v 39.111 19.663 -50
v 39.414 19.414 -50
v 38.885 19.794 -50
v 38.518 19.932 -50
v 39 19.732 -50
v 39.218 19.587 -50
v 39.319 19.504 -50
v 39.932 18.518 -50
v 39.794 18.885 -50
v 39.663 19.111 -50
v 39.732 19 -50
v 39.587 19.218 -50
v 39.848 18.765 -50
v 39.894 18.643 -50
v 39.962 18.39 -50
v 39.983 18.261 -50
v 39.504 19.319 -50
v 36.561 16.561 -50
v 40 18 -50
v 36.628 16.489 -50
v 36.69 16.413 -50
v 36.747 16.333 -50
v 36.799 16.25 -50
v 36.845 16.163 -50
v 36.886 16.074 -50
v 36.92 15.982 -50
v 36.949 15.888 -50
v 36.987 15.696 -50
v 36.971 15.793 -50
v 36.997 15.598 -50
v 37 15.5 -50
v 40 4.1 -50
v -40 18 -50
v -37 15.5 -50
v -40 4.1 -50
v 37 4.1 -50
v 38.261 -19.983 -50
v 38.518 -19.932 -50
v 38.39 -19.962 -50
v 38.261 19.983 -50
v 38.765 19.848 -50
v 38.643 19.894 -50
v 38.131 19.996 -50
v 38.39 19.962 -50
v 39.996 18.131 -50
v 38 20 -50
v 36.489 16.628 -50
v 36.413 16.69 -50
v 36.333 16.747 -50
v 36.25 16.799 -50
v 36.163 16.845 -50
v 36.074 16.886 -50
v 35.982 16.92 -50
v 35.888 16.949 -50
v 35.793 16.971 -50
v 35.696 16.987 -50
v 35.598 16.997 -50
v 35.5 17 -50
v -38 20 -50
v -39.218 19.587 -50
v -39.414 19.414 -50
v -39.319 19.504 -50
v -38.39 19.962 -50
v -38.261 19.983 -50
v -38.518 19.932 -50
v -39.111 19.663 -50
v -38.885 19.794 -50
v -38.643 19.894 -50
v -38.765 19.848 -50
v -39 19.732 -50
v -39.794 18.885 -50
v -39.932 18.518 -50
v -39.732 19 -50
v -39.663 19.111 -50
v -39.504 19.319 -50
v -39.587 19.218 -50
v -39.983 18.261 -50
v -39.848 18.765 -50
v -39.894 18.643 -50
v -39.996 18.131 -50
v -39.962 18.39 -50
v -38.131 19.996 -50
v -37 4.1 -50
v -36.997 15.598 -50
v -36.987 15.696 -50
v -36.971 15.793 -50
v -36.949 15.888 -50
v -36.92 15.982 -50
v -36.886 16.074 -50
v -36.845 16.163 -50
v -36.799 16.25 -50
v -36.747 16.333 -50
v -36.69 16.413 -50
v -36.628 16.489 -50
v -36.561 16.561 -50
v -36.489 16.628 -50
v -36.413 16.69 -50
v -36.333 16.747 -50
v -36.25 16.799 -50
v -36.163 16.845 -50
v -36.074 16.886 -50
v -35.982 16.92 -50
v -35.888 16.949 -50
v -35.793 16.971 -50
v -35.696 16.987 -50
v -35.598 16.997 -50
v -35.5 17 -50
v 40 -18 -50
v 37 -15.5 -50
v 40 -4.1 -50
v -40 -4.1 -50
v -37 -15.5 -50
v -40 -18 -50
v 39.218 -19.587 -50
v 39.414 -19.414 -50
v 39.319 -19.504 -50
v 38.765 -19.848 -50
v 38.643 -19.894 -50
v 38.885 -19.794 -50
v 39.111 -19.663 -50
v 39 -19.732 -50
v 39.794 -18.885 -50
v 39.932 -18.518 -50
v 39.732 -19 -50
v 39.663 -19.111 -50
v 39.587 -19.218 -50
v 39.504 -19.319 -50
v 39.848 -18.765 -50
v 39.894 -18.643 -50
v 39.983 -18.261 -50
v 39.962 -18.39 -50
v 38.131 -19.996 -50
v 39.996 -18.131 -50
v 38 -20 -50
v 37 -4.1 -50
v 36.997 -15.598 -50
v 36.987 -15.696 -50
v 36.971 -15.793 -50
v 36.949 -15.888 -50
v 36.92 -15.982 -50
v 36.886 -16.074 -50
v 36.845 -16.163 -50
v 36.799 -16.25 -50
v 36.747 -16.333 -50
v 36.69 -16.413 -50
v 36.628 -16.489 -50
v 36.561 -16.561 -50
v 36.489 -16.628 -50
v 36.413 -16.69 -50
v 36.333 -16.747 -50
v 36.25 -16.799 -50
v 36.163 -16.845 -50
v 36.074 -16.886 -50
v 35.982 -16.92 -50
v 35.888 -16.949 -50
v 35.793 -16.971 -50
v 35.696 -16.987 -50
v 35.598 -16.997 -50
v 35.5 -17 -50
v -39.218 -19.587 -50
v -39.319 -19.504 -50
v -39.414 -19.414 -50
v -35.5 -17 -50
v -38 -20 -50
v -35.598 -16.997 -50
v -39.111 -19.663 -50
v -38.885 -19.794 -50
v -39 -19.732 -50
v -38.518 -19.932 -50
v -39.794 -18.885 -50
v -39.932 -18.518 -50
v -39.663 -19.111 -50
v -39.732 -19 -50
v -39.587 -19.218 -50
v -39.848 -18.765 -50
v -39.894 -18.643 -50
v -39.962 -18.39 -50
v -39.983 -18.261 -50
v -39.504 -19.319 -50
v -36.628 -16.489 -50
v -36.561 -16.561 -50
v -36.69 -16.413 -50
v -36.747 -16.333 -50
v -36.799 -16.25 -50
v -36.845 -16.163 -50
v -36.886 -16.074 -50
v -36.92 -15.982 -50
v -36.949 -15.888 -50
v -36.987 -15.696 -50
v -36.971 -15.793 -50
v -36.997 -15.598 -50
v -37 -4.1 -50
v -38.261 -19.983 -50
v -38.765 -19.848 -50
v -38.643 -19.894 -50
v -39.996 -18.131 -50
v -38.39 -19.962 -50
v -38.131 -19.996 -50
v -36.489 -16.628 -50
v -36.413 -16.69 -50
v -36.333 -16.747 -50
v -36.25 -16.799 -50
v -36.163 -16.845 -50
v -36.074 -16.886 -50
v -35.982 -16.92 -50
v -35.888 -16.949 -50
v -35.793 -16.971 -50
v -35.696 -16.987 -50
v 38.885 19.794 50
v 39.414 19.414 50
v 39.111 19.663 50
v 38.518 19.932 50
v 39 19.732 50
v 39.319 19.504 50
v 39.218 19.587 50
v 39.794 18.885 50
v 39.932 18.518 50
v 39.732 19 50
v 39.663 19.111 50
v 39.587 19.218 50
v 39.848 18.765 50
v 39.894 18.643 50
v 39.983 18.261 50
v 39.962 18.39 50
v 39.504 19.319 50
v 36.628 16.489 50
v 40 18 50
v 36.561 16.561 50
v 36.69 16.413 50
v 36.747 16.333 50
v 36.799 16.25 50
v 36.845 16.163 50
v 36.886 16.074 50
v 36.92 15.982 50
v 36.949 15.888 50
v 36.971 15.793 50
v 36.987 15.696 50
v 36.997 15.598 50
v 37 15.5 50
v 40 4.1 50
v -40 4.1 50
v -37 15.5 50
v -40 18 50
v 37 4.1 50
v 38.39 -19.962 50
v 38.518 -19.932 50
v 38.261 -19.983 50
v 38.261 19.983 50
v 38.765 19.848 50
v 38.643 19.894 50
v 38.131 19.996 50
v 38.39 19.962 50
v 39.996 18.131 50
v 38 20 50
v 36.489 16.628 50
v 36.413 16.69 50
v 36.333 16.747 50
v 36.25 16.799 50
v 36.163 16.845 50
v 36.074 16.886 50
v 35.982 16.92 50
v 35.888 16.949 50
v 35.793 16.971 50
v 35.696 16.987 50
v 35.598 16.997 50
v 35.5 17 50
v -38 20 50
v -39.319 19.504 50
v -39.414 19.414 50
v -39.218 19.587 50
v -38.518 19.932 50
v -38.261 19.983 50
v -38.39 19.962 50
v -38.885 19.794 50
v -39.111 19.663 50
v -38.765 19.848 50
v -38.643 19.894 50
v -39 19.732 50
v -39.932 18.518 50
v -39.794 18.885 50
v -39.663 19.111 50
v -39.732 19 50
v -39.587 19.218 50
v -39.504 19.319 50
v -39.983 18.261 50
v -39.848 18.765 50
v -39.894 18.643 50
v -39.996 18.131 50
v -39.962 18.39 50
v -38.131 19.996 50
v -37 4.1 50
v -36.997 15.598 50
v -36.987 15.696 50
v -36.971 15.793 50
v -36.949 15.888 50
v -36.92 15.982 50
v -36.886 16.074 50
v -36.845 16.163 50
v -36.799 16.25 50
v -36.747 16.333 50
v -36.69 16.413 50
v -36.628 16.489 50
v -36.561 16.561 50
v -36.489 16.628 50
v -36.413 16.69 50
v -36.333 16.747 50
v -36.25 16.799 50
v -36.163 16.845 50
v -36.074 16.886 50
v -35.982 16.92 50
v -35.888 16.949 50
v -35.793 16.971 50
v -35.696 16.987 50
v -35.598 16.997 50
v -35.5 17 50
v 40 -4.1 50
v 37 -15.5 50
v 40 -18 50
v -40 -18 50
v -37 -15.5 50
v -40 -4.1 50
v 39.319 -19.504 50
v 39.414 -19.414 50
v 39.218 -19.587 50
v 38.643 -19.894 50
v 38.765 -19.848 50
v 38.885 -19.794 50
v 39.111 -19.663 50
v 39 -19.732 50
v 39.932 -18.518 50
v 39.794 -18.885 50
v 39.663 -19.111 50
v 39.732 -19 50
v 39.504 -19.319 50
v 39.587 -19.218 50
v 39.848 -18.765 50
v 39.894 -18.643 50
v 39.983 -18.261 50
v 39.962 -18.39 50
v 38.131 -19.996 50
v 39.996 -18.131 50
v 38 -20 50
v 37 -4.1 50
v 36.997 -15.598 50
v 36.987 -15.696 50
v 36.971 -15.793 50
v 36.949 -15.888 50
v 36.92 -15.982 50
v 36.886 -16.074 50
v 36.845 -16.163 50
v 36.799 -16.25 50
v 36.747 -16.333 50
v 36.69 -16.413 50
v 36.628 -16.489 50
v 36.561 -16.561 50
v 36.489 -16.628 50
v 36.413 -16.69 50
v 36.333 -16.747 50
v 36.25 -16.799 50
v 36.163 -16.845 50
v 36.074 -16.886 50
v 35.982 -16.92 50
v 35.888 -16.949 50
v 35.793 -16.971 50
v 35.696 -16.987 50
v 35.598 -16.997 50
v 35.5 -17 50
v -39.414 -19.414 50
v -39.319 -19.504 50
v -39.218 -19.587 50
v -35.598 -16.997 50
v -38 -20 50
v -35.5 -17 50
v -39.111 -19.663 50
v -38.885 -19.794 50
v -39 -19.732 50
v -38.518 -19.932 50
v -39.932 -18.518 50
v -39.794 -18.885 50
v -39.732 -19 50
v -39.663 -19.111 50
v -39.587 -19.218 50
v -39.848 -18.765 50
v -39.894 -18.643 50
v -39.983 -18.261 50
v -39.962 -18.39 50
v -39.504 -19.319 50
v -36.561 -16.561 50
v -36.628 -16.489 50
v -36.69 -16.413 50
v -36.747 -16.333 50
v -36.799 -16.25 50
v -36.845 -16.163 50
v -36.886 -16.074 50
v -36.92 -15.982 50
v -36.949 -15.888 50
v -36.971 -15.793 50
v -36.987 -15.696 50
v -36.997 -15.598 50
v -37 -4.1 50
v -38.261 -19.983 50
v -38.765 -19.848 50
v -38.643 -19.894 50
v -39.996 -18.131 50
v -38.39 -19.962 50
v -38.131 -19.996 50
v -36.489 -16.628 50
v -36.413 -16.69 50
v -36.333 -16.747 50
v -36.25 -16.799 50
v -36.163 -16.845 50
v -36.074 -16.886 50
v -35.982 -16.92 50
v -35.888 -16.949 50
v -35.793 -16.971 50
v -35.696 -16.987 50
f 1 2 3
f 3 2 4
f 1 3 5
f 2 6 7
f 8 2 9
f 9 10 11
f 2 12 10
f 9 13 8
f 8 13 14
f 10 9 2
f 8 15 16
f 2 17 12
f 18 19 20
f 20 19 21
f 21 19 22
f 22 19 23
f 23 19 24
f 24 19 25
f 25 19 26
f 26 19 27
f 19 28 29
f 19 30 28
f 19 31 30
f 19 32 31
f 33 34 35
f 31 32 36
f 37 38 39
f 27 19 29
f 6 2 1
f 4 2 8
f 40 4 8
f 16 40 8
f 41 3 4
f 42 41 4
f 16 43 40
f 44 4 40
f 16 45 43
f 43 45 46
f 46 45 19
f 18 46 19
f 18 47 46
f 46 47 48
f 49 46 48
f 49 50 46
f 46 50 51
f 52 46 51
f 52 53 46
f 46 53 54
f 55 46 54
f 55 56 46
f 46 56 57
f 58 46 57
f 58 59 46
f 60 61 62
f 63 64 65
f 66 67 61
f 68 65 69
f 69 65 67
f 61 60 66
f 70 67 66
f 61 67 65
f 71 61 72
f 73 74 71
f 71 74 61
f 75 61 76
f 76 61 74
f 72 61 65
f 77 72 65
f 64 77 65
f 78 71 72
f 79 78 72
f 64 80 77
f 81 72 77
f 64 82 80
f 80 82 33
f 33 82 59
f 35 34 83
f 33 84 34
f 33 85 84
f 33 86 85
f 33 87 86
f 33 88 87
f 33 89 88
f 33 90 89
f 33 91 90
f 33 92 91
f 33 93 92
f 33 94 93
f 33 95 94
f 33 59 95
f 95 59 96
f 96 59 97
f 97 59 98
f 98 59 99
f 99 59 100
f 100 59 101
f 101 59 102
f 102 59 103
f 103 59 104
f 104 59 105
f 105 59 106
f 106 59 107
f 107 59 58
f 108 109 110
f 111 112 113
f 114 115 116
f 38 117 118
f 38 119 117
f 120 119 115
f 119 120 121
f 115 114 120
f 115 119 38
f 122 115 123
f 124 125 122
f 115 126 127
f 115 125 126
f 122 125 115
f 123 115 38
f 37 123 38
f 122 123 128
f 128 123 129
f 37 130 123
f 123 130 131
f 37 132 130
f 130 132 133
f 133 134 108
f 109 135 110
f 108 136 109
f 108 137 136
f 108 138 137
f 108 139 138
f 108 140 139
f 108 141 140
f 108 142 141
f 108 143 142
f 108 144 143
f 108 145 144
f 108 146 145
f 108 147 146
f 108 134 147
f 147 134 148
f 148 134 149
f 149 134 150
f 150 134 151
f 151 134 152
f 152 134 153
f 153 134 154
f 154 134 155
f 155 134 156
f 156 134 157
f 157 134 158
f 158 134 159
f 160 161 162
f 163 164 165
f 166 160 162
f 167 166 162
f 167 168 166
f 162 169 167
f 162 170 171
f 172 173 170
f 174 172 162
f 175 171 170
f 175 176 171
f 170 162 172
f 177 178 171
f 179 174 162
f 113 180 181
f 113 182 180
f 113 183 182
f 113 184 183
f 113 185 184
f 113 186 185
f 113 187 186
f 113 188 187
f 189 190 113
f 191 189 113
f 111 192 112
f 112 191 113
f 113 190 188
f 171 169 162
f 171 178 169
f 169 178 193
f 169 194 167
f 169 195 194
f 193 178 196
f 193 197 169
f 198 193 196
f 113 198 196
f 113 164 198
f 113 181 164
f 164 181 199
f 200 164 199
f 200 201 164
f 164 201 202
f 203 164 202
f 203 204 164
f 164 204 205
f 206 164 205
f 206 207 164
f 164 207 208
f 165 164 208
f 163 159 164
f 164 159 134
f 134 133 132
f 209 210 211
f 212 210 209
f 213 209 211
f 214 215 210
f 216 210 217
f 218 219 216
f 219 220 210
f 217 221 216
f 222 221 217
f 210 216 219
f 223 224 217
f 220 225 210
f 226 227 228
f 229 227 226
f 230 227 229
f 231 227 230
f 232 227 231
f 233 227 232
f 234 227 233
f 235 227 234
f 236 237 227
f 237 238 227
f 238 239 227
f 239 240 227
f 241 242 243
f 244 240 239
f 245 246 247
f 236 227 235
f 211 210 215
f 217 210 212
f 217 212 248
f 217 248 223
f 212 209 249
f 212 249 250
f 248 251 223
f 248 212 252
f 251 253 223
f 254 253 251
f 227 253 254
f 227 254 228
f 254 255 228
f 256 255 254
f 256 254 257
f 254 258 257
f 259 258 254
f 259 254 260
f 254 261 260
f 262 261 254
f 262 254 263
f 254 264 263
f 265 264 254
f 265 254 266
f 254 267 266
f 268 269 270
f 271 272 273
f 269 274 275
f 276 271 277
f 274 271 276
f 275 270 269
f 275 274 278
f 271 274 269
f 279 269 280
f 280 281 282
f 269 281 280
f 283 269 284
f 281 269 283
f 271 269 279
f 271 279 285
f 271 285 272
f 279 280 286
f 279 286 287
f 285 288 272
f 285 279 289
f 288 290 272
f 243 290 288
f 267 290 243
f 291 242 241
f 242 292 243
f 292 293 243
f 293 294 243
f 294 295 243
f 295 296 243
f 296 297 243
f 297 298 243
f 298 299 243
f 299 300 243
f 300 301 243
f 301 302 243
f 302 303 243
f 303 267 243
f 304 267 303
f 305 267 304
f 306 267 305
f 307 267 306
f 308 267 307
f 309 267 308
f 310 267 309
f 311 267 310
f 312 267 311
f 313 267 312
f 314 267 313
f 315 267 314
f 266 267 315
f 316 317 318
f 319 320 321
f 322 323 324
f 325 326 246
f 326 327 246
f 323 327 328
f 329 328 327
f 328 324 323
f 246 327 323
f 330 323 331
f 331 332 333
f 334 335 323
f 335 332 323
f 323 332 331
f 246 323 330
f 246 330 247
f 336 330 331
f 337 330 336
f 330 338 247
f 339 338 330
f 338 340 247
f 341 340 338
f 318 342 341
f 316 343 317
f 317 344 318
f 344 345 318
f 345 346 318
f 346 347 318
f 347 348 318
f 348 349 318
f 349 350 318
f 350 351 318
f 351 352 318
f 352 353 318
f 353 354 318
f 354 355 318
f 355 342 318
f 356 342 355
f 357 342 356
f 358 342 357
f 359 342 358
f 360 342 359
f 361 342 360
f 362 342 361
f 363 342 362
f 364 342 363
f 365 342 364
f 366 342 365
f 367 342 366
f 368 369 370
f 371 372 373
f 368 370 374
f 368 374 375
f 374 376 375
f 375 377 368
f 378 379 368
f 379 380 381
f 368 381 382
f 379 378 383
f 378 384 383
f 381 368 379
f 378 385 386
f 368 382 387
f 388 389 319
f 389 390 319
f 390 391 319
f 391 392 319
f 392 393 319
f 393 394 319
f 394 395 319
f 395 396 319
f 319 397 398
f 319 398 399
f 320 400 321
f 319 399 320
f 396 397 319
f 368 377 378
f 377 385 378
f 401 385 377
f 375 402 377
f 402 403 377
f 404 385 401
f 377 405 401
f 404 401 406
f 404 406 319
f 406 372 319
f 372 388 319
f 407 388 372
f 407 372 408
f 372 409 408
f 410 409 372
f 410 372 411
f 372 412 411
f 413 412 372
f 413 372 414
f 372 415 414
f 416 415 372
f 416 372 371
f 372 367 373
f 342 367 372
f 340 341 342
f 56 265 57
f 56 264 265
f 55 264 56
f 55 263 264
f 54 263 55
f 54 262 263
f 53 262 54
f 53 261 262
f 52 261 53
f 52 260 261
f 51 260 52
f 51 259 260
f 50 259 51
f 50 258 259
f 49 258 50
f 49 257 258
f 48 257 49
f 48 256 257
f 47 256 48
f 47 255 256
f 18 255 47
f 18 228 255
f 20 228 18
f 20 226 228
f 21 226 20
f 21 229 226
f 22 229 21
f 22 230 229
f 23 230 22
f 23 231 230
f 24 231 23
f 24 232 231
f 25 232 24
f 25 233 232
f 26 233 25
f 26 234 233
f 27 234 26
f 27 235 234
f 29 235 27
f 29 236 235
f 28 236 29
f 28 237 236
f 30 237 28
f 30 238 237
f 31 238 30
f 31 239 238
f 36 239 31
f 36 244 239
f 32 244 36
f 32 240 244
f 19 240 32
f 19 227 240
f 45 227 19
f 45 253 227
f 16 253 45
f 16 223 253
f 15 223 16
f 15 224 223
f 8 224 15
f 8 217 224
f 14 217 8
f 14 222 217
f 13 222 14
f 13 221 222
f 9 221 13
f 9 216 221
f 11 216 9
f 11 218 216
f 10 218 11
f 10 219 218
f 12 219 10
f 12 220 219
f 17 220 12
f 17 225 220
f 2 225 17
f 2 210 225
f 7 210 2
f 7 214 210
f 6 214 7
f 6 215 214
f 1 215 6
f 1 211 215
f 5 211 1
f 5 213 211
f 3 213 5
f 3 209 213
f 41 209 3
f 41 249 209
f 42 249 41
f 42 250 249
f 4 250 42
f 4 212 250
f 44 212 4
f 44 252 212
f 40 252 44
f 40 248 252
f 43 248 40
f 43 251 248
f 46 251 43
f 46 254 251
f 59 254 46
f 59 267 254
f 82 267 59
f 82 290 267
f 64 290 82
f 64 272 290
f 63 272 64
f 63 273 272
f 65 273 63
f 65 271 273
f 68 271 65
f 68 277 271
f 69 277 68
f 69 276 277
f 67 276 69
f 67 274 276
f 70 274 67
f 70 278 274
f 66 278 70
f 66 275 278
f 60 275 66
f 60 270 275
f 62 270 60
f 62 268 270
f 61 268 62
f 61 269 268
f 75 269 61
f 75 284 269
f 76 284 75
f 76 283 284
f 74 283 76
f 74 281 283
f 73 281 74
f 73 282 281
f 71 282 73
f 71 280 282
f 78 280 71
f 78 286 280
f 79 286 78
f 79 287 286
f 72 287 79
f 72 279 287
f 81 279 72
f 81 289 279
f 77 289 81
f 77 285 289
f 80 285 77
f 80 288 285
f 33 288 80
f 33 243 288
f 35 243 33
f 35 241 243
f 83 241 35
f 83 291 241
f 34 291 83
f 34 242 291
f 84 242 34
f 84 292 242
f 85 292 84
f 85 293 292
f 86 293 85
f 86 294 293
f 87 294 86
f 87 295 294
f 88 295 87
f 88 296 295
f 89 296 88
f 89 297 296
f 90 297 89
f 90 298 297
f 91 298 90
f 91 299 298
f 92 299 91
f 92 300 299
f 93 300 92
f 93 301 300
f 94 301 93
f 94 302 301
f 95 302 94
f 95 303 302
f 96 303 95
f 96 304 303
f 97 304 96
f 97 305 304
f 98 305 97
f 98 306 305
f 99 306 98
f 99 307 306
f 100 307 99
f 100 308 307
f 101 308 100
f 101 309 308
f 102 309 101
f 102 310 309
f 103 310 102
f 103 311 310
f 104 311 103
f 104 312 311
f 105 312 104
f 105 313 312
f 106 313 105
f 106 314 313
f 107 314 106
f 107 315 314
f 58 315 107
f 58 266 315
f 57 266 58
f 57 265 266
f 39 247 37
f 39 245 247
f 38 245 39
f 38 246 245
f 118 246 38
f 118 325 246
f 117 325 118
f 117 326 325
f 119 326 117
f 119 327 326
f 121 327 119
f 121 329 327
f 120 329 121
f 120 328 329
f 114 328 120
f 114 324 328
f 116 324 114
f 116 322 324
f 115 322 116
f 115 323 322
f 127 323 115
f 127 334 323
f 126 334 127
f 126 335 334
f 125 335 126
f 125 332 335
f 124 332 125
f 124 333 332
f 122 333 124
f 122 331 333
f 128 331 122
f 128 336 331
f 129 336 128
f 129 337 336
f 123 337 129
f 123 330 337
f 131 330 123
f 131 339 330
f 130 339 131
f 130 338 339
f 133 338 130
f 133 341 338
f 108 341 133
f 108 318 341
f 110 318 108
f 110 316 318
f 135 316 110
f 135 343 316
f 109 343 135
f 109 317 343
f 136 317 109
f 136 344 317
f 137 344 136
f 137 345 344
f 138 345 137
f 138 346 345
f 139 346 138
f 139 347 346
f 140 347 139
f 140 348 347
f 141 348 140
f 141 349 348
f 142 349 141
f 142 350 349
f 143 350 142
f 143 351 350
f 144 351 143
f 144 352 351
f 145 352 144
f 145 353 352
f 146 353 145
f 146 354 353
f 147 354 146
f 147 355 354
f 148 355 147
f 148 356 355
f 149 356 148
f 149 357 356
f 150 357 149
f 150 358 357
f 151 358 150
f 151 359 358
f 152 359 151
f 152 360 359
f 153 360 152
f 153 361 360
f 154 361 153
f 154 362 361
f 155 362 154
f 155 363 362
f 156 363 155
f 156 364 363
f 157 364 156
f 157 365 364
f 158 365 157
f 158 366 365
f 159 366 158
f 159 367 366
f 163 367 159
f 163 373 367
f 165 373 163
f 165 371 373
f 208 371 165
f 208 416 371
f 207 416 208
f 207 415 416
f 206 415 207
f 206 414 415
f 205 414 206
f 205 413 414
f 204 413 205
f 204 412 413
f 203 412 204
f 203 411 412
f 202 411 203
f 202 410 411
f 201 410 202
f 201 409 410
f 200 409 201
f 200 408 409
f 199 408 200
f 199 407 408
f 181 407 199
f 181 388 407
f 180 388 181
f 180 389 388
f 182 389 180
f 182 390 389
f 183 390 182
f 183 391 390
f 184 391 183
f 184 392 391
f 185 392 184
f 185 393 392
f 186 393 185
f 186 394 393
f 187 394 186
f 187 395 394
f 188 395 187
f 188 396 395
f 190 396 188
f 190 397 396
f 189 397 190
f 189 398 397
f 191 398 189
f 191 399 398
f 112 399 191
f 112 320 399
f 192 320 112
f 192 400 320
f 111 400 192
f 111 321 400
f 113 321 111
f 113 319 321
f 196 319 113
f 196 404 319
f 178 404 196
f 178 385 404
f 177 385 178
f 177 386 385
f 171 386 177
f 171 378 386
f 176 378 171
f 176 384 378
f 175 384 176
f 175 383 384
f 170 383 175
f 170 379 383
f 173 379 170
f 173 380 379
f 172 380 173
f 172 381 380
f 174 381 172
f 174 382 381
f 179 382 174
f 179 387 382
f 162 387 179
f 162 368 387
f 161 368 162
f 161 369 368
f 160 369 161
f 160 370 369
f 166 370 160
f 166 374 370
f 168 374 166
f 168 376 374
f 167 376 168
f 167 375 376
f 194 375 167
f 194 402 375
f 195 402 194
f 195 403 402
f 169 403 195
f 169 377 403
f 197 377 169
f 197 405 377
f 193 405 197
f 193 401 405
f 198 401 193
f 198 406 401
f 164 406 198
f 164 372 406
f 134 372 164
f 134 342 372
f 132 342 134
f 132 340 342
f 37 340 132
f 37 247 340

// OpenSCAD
// 40x80 aluminum T-slot extrusion (approximate 8-series), 100mm long
// One connected solid: outer body minus connected internal voids + 4 face T-slots.

$fn = 96;

// ---------- Parameters (mm) ----------
extrusion_length = 100;

W = 80;   // X overall
H = 40;   // Y overall

corner_r = 2.0;

// Typical 8-series-ish slot sizes (approximate)
slot_open = 8.2;     // opening at surface
slot_neck = 6.2;     // neck width
slot_cavity = 13.0;  // inner cavity width
slot_depth = 12.0;   // depth from surface

// Structure
wall = 3.0;          // outer wall thickness
web = 3.0;           // internal web thickness (keeps it ONE connected solid)
center_bore_d = 10.0;

inner_corner_r = 1.5;
eps = 0.05;

// ---------- Helpers ----------
module rounded_rect(w, h, r) {
    r2 = min(r, min(w, h)/2);
    hull() {
        for (sx = [-1, 1], sy = [-1, 1])
            translate([sx*(w/2 - r2), sy*(h/2 - r2)])
                circle(r = r2);
    }
}

// 2D T-slot cutter on +X or -X face (centered in Y)
module tslot_cut_x(side = 1) {
    // Build a connected "T" void that starts at the surface and goes inward.
    // All translate values are derived from dimensions.
    x_surface = side * (W/2);
    x_in = x_surface - side * slot_depth; // inner end of slot depth

    union() {
        // Opening at surface (short depth)
        // Make it a rectangle that touches the surface and extends inward.
        open_depth = slot_open; // approximate
        translate([ (x_surface + (x_surface - side*open_depth))/2, 0 ])
            square([open_depth, slot_open], center=true);

        // Neck (full depth)
        translate([ (x_surface + x_in)/2, 0 ])
            square([slot_depth, slot_neck], center=true);

        // Inner cavity (placed near inner end, still connected to neck)
        cav_depth = slot_depth * 0.65;
        x_cav_center = x_in + side * (cav_depth/2); // cavity spans from x_in to x_in+side*cav_depth
        translate([x_cav_center, 0])
            square([cav_depth, slot_cavity], center=true);
    }
}

// 2D T-slot cutter on +Y or -Y face (centered in X)
module tslot_cut_y(side = 1) {
    rotate(90) tslot_cut_x(side);
}

module extrusion_cross_section() {
    difference() {
        // Outer boundary (single piece)
        rounded_rect(W, H, corner_r);

        // ---- Internal voids (kept connected, do NOT split the solid) ----

        // Central bore
        circle(d = center_bore_d);

        // Main inner pocket (leaves outer wall)
        // This alone would create a hollow rectangle; we add webs to keep realistic extrusion look.
        rounded_rect(W - 2*wall, H - 2*wall, inner_corner_r);

        // Add back material as webs by subtracting "voids" that avoid the web regions:
        // Instead of adding material, we carve the inner pocket into 4 corner pockets,
        // leaving a cross-shaped web (vertical + horizontal) of thickness 'web'.
        //
        // We do this by subtracting 4 corner pockets (voids) from the already-subtracted inner pocket area:
        // In OpenSCAD difference(), to "leave" webs, we must NOT subtract where webs are.
        // So we subtract only the corner pockets (which are inside the inner pocket),
        // and we DO NOT subtract the cross web region.

        // Corner pockets (4) inside the inner boundary, leaving a cross web.
        // Each pocket is a rounded rectangle quadrant-like pocket.
        pocket_w = (W - 2*wall - web) / 2;
        pocket_h = (H - 2*wall - web) / 2;

        for (sx = [-1, 1], sy = [-1, 1]) {
            translate([sx*(web/2 + pocket_w/2), sy*(web/2 + pocket_h/2)])
                rounded_rect(pocket_w, pocket_h, inner_corner_r);
        }

        // ---- Face T-slots (4 sides) ----
        tslot_cut_x(+1);
        tslot_cut_x(-1);
        tslot_cut_y(+1);
        tslot_cut_y(-1);
    }
}

module extrusion() {
    linear_extrude(height = extrusion_length, center = true, convexity = 10)
        extrusion_cross_section();
}

// Render
extrusion();
